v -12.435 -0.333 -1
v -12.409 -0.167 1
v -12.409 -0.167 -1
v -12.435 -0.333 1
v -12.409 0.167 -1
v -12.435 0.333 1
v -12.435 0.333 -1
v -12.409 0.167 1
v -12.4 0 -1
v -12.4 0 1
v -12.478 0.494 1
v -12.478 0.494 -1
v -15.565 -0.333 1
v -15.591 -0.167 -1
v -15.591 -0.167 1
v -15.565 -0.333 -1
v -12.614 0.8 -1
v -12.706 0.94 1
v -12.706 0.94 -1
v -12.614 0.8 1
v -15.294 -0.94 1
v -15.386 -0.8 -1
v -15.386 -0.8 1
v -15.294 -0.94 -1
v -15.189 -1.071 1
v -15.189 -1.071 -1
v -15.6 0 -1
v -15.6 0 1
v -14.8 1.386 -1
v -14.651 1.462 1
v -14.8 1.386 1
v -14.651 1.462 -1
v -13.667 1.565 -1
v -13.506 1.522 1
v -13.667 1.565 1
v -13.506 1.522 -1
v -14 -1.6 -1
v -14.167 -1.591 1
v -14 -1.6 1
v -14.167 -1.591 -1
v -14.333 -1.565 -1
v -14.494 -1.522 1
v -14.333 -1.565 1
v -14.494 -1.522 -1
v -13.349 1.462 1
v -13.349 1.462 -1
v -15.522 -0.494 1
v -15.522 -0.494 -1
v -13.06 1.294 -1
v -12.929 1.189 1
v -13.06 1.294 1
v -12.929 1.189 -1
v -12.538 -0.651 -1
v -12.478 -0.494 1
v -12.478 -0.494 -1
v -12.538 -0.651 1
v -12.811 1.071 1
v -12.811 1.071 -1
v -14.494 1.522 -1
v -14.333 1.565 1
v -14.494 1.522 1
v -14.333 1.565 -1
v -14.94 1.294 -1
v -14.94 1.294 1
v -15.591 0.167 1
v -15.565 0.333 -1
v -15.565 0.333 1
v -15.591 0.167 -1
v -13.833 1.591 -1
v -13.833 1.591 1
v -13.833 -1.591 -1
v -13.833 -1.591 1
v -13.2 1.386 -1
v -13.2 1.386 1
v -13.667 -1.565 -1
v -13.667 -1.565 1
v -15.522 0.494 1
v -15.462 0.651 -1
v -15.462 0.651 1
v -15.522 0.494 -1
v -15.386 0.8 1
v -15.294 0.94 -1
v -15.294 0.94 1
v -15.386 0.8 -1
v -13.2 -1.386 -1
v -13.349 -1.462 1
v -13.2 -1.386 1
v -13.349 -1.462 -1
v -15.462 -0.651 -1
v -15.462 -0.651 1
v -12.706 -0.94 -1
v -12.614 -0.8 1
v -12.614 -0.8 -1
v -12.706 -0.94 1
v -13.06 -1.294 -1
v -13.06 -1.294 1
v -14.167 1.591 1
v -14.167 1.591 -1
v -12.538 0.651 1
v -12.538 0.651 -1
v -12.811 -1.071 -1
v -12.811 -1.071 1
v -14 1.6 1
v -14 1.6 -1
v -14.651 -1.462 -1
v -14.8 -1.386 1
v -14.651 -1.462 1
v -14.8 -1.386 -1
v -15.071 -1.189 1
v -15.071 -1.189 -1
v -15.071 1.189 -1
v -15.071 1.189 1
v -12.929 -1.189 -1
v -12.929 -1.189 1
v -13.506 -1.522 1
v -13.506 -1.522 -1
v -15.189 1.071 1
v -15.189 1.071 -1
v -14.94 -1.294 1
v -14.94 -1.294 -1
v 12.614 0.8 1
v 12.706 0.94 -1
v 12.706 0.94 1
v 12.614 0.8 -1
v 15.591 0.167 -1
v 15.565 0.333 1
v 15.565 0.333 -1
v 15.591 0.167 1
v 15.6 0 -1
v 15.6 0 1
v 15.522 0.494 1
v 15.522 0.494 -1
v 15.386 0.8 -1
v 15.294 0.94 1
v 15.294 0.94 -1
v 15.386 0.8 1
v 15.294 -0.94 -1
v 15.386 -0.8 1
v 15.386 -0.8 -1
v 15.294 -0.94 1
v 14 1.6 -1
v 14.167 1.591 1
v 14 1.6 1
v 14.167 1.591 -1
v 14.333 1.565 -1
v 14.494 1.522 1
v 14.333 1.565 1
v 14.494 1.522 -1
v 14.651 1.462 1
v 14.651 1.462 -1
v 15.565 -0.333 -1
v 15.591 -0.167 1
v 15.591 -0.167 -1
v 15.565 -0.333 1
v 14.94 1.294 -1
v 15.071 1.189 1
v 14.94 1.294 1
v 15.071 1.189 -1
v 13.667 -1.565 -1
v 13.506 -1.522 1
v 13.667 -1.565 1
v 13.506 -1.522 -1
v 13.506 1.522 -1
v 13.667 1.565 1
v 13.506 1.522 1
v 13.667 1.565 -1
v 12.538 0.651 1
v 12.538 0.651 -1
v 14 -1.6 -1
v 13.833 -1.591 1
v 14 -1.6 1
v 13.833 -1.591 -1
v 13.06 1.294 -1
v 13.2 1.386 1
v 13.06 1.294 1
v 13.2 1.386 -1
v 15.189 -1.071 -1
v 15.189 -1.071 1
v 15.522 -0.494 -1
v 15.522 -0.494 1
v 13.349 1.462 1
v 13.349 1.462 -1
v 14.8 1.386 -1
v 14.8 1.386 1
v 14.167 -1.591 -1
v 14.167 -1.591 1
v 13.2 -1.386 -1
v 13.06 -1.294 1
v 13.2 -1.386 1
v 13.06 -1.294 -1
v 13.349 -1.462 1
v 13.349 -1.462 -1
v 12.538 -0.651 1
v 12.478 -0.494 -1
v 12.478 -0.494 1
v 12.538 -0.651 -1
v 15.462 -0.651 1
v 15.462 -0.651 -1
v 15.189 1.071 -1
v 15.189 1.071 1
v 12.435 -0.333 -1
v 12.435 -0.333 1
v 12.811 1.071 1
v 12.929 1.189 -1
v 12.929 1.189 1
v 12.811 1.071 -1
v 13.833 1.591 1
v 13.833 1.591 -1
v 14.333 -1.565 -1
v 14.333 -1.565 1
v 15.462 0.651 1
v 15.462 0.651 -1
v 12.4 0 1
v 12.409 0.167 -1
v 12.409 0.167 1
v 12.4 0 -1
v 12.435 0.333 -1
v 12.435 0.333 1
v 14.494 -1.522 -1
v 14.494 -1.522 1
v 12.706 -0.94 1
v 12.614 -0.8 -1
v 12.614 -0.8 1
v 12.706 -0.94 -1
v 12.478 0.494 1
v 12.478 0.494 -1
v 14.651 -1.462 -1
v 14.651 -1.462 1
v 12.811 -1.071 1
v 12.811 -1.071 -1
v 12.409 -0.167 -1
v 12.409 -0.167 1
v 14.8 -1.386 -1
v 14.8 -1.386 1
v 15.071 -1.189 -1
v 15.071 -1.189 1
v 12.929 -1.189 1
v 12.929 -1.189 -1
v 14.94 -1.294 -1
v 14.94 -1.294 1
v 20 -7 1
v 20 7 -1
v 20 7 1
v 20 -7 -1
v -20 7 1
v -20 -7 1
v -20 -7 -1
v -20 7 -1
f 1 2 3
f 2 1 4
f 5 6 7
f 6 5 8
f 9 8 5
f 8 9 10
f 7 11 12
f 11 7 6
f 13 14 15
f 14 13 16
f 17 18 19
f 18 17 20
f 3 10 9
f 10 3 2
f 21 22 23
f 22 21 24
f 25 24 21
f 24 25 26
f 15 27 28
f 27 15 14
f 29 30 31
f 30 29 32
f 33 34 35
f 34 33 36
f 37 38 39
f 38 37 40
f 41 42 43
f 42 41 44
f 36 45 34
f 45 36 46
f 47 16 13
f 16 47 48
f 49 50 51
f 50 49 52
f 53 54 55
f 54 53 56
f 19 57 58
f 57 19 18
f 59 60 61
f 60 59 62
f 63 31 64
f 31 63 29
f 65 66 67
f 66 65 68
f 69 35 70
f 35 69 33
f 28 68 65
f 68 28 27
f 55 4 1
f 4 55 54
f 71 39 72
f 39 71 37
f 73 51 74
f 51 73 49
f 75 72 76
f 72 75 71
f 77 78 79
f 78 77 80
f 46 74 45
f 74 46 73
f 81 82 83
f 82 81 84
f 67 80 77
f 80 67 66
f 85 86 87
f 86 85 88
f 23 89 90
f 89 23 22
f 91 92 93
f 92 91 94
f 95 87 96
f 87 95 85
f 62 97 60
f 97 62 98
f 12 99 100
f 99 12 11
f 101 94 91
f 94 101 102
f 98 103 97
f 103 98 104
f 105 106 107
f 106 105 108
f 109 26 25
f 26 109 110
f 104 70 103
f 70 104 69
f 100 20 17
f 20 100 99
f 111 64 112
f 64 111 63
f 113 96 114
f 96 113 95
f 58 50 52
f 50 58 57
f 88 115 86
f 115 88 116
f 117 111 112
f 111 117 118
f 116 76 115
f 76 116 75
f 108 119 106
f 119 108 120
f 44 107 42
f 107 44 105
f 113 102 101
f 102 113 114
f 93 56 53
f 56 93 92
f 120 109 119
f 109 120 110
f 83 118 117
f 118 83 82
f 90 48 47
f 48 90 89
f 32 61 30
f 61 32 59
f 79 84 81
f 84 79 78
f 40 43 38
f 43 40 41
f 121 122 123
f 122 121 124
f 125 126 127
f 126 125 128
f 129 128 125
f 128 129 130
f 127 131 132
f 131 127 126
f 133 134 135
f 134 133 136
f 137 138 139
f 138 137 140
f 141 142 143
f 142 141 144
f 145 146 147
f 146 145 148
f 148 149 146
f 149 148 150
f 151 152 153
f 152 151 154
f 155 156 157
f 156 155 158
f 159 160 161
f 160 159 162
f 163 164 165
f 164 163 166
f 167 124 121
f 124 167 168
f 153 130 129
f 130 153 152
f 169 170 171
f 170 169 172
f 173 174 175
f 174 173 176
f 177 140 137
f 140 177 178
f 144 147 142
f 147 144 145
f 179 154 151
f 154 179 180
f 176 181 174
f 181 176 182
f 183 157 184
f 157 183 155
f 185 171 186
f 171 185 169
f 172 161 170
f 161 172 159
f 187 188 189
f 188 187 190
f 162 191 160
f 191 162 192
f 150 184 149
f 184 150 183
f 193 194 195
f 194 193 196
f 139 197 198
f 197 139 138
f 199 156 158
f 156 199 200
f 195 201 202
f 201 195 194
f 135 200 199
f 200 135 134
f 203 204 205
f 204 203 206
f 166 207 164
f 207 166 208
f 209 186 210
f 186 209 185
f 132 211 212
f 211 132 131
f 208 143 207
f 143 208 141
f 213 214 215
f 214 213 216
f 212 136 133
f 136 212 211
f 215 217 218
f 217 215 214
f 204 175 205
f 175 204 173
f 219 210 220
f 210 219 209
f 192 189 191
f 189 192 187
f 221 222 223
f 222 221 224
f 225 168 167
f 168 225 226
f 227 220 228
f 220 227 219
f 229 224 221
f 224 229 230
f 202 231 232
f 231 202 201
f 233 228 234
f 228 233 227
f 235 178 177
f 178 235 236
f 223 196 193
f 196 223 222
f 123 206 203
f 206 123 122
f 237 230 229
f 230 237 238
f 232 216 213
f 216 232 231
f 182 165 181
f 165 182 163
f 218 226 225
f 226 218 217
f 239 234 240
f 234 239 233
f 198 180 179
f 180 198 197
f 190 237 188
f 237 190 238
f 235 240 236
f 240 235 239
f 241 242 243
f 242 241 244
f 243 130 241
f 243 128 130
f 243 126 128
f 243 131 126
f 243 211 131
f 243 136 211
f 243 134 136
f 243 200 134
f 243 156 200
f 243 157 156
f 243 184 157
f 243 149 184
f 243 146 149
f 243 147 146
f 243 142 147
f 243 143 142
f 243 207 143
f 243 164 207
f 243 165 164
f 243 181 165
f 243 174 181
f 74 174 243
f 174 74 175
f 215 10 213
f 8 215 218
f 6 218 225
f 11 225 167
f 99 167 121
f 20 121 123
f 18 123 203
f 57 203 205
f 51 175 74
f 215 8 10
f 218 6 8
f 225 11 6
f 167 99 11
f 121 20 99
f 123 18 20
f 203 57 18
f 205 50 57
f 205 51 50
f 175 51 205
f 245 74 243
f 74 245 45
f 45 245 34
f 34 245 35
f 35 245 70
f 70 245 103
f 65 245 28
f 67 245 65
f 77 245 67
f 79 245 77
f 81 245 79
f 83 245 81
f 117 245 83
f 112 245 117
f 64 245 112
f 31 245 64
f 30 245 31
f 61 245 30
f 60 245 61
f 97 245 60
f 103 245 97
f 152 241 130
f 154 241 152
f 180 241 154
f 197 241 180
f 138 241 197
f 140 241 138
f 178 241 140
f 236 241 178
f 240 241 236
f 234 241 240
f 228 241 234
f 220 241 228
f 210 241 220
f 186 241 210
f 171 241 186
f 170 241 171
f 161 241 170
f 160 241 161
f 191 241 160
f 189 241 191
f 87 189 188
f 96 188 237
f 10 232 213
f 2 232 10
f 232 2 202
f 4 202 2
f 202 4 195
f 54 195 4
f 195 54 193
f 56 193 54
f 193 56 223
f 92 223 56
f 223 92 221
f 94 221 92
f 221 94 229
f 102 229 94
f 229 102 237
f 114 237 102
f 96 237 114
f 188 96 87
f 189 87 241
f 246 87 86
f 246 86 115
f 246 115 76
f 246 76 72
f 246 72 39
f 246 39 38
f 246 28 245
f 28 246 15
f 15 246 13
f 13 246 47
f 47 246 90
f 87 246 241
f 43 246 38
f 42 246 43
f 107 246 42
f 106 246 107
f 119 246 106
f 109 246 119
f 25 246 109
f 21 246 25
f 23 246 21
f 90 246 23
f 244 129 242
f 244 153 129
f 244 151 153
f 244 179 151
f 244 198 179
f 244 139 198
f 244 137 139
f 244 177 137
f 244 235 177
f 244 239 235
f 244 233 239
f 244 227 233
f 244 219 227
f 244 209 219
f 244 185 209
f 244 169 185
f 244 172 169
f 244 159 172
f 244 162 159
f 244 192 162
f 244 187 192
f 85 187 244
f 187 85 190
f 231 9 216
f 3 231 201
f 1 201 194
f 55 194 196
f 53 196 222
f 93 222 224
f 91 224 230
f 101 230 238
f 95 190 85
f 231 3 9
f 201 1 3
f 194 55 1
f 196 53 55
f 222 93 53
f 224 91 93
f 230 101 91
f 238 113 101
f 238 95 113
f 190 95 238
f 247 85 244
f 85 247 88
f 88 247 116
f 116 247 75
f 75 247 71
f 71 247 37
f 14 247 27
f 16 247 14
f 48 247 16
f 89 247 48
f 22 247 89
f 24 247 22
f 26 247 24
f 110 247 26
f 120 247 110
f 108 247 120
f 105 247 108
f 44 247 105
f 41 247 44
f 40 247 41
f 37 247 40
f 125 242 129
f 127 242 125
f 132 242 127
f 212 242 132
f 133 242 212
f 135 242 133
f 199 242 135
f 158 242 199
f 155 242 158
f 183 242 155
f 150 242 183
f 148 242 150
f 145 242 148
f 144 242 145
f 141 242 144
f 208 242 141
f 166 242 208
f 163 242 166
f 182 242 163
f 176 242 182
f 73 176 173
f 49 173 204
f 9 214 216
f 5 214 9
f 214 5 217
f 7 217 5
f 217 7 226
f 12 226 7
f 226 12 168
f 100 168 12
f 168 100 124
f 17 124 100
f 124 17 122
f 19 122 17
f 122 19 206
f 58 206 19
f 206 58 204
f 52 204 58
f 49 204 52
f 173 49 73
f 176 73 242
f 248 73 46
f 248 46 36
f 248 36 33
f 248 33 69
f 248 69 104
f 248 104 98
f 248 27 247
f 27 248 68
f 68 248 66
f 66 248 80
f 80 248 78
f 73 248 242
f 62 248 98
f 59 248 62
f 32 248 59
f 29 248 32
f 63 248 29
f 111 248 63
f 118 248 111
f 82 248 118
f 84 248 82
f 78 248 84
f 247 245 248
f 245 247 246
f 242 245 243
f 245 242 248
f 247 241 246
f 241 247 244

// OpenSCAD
// Engraving-ready nameplate.
$fn = 60;
eps = 0.02;
length = 40;
width = 14;
thickness = 2;
difference() { cube([length,width,thickness],center=true); for(x=[-length/2+6,length/2-6]) translate([x,0,-thickness/2-eps]) cylinder(d=3.2,h=thickness+2*eps); }
